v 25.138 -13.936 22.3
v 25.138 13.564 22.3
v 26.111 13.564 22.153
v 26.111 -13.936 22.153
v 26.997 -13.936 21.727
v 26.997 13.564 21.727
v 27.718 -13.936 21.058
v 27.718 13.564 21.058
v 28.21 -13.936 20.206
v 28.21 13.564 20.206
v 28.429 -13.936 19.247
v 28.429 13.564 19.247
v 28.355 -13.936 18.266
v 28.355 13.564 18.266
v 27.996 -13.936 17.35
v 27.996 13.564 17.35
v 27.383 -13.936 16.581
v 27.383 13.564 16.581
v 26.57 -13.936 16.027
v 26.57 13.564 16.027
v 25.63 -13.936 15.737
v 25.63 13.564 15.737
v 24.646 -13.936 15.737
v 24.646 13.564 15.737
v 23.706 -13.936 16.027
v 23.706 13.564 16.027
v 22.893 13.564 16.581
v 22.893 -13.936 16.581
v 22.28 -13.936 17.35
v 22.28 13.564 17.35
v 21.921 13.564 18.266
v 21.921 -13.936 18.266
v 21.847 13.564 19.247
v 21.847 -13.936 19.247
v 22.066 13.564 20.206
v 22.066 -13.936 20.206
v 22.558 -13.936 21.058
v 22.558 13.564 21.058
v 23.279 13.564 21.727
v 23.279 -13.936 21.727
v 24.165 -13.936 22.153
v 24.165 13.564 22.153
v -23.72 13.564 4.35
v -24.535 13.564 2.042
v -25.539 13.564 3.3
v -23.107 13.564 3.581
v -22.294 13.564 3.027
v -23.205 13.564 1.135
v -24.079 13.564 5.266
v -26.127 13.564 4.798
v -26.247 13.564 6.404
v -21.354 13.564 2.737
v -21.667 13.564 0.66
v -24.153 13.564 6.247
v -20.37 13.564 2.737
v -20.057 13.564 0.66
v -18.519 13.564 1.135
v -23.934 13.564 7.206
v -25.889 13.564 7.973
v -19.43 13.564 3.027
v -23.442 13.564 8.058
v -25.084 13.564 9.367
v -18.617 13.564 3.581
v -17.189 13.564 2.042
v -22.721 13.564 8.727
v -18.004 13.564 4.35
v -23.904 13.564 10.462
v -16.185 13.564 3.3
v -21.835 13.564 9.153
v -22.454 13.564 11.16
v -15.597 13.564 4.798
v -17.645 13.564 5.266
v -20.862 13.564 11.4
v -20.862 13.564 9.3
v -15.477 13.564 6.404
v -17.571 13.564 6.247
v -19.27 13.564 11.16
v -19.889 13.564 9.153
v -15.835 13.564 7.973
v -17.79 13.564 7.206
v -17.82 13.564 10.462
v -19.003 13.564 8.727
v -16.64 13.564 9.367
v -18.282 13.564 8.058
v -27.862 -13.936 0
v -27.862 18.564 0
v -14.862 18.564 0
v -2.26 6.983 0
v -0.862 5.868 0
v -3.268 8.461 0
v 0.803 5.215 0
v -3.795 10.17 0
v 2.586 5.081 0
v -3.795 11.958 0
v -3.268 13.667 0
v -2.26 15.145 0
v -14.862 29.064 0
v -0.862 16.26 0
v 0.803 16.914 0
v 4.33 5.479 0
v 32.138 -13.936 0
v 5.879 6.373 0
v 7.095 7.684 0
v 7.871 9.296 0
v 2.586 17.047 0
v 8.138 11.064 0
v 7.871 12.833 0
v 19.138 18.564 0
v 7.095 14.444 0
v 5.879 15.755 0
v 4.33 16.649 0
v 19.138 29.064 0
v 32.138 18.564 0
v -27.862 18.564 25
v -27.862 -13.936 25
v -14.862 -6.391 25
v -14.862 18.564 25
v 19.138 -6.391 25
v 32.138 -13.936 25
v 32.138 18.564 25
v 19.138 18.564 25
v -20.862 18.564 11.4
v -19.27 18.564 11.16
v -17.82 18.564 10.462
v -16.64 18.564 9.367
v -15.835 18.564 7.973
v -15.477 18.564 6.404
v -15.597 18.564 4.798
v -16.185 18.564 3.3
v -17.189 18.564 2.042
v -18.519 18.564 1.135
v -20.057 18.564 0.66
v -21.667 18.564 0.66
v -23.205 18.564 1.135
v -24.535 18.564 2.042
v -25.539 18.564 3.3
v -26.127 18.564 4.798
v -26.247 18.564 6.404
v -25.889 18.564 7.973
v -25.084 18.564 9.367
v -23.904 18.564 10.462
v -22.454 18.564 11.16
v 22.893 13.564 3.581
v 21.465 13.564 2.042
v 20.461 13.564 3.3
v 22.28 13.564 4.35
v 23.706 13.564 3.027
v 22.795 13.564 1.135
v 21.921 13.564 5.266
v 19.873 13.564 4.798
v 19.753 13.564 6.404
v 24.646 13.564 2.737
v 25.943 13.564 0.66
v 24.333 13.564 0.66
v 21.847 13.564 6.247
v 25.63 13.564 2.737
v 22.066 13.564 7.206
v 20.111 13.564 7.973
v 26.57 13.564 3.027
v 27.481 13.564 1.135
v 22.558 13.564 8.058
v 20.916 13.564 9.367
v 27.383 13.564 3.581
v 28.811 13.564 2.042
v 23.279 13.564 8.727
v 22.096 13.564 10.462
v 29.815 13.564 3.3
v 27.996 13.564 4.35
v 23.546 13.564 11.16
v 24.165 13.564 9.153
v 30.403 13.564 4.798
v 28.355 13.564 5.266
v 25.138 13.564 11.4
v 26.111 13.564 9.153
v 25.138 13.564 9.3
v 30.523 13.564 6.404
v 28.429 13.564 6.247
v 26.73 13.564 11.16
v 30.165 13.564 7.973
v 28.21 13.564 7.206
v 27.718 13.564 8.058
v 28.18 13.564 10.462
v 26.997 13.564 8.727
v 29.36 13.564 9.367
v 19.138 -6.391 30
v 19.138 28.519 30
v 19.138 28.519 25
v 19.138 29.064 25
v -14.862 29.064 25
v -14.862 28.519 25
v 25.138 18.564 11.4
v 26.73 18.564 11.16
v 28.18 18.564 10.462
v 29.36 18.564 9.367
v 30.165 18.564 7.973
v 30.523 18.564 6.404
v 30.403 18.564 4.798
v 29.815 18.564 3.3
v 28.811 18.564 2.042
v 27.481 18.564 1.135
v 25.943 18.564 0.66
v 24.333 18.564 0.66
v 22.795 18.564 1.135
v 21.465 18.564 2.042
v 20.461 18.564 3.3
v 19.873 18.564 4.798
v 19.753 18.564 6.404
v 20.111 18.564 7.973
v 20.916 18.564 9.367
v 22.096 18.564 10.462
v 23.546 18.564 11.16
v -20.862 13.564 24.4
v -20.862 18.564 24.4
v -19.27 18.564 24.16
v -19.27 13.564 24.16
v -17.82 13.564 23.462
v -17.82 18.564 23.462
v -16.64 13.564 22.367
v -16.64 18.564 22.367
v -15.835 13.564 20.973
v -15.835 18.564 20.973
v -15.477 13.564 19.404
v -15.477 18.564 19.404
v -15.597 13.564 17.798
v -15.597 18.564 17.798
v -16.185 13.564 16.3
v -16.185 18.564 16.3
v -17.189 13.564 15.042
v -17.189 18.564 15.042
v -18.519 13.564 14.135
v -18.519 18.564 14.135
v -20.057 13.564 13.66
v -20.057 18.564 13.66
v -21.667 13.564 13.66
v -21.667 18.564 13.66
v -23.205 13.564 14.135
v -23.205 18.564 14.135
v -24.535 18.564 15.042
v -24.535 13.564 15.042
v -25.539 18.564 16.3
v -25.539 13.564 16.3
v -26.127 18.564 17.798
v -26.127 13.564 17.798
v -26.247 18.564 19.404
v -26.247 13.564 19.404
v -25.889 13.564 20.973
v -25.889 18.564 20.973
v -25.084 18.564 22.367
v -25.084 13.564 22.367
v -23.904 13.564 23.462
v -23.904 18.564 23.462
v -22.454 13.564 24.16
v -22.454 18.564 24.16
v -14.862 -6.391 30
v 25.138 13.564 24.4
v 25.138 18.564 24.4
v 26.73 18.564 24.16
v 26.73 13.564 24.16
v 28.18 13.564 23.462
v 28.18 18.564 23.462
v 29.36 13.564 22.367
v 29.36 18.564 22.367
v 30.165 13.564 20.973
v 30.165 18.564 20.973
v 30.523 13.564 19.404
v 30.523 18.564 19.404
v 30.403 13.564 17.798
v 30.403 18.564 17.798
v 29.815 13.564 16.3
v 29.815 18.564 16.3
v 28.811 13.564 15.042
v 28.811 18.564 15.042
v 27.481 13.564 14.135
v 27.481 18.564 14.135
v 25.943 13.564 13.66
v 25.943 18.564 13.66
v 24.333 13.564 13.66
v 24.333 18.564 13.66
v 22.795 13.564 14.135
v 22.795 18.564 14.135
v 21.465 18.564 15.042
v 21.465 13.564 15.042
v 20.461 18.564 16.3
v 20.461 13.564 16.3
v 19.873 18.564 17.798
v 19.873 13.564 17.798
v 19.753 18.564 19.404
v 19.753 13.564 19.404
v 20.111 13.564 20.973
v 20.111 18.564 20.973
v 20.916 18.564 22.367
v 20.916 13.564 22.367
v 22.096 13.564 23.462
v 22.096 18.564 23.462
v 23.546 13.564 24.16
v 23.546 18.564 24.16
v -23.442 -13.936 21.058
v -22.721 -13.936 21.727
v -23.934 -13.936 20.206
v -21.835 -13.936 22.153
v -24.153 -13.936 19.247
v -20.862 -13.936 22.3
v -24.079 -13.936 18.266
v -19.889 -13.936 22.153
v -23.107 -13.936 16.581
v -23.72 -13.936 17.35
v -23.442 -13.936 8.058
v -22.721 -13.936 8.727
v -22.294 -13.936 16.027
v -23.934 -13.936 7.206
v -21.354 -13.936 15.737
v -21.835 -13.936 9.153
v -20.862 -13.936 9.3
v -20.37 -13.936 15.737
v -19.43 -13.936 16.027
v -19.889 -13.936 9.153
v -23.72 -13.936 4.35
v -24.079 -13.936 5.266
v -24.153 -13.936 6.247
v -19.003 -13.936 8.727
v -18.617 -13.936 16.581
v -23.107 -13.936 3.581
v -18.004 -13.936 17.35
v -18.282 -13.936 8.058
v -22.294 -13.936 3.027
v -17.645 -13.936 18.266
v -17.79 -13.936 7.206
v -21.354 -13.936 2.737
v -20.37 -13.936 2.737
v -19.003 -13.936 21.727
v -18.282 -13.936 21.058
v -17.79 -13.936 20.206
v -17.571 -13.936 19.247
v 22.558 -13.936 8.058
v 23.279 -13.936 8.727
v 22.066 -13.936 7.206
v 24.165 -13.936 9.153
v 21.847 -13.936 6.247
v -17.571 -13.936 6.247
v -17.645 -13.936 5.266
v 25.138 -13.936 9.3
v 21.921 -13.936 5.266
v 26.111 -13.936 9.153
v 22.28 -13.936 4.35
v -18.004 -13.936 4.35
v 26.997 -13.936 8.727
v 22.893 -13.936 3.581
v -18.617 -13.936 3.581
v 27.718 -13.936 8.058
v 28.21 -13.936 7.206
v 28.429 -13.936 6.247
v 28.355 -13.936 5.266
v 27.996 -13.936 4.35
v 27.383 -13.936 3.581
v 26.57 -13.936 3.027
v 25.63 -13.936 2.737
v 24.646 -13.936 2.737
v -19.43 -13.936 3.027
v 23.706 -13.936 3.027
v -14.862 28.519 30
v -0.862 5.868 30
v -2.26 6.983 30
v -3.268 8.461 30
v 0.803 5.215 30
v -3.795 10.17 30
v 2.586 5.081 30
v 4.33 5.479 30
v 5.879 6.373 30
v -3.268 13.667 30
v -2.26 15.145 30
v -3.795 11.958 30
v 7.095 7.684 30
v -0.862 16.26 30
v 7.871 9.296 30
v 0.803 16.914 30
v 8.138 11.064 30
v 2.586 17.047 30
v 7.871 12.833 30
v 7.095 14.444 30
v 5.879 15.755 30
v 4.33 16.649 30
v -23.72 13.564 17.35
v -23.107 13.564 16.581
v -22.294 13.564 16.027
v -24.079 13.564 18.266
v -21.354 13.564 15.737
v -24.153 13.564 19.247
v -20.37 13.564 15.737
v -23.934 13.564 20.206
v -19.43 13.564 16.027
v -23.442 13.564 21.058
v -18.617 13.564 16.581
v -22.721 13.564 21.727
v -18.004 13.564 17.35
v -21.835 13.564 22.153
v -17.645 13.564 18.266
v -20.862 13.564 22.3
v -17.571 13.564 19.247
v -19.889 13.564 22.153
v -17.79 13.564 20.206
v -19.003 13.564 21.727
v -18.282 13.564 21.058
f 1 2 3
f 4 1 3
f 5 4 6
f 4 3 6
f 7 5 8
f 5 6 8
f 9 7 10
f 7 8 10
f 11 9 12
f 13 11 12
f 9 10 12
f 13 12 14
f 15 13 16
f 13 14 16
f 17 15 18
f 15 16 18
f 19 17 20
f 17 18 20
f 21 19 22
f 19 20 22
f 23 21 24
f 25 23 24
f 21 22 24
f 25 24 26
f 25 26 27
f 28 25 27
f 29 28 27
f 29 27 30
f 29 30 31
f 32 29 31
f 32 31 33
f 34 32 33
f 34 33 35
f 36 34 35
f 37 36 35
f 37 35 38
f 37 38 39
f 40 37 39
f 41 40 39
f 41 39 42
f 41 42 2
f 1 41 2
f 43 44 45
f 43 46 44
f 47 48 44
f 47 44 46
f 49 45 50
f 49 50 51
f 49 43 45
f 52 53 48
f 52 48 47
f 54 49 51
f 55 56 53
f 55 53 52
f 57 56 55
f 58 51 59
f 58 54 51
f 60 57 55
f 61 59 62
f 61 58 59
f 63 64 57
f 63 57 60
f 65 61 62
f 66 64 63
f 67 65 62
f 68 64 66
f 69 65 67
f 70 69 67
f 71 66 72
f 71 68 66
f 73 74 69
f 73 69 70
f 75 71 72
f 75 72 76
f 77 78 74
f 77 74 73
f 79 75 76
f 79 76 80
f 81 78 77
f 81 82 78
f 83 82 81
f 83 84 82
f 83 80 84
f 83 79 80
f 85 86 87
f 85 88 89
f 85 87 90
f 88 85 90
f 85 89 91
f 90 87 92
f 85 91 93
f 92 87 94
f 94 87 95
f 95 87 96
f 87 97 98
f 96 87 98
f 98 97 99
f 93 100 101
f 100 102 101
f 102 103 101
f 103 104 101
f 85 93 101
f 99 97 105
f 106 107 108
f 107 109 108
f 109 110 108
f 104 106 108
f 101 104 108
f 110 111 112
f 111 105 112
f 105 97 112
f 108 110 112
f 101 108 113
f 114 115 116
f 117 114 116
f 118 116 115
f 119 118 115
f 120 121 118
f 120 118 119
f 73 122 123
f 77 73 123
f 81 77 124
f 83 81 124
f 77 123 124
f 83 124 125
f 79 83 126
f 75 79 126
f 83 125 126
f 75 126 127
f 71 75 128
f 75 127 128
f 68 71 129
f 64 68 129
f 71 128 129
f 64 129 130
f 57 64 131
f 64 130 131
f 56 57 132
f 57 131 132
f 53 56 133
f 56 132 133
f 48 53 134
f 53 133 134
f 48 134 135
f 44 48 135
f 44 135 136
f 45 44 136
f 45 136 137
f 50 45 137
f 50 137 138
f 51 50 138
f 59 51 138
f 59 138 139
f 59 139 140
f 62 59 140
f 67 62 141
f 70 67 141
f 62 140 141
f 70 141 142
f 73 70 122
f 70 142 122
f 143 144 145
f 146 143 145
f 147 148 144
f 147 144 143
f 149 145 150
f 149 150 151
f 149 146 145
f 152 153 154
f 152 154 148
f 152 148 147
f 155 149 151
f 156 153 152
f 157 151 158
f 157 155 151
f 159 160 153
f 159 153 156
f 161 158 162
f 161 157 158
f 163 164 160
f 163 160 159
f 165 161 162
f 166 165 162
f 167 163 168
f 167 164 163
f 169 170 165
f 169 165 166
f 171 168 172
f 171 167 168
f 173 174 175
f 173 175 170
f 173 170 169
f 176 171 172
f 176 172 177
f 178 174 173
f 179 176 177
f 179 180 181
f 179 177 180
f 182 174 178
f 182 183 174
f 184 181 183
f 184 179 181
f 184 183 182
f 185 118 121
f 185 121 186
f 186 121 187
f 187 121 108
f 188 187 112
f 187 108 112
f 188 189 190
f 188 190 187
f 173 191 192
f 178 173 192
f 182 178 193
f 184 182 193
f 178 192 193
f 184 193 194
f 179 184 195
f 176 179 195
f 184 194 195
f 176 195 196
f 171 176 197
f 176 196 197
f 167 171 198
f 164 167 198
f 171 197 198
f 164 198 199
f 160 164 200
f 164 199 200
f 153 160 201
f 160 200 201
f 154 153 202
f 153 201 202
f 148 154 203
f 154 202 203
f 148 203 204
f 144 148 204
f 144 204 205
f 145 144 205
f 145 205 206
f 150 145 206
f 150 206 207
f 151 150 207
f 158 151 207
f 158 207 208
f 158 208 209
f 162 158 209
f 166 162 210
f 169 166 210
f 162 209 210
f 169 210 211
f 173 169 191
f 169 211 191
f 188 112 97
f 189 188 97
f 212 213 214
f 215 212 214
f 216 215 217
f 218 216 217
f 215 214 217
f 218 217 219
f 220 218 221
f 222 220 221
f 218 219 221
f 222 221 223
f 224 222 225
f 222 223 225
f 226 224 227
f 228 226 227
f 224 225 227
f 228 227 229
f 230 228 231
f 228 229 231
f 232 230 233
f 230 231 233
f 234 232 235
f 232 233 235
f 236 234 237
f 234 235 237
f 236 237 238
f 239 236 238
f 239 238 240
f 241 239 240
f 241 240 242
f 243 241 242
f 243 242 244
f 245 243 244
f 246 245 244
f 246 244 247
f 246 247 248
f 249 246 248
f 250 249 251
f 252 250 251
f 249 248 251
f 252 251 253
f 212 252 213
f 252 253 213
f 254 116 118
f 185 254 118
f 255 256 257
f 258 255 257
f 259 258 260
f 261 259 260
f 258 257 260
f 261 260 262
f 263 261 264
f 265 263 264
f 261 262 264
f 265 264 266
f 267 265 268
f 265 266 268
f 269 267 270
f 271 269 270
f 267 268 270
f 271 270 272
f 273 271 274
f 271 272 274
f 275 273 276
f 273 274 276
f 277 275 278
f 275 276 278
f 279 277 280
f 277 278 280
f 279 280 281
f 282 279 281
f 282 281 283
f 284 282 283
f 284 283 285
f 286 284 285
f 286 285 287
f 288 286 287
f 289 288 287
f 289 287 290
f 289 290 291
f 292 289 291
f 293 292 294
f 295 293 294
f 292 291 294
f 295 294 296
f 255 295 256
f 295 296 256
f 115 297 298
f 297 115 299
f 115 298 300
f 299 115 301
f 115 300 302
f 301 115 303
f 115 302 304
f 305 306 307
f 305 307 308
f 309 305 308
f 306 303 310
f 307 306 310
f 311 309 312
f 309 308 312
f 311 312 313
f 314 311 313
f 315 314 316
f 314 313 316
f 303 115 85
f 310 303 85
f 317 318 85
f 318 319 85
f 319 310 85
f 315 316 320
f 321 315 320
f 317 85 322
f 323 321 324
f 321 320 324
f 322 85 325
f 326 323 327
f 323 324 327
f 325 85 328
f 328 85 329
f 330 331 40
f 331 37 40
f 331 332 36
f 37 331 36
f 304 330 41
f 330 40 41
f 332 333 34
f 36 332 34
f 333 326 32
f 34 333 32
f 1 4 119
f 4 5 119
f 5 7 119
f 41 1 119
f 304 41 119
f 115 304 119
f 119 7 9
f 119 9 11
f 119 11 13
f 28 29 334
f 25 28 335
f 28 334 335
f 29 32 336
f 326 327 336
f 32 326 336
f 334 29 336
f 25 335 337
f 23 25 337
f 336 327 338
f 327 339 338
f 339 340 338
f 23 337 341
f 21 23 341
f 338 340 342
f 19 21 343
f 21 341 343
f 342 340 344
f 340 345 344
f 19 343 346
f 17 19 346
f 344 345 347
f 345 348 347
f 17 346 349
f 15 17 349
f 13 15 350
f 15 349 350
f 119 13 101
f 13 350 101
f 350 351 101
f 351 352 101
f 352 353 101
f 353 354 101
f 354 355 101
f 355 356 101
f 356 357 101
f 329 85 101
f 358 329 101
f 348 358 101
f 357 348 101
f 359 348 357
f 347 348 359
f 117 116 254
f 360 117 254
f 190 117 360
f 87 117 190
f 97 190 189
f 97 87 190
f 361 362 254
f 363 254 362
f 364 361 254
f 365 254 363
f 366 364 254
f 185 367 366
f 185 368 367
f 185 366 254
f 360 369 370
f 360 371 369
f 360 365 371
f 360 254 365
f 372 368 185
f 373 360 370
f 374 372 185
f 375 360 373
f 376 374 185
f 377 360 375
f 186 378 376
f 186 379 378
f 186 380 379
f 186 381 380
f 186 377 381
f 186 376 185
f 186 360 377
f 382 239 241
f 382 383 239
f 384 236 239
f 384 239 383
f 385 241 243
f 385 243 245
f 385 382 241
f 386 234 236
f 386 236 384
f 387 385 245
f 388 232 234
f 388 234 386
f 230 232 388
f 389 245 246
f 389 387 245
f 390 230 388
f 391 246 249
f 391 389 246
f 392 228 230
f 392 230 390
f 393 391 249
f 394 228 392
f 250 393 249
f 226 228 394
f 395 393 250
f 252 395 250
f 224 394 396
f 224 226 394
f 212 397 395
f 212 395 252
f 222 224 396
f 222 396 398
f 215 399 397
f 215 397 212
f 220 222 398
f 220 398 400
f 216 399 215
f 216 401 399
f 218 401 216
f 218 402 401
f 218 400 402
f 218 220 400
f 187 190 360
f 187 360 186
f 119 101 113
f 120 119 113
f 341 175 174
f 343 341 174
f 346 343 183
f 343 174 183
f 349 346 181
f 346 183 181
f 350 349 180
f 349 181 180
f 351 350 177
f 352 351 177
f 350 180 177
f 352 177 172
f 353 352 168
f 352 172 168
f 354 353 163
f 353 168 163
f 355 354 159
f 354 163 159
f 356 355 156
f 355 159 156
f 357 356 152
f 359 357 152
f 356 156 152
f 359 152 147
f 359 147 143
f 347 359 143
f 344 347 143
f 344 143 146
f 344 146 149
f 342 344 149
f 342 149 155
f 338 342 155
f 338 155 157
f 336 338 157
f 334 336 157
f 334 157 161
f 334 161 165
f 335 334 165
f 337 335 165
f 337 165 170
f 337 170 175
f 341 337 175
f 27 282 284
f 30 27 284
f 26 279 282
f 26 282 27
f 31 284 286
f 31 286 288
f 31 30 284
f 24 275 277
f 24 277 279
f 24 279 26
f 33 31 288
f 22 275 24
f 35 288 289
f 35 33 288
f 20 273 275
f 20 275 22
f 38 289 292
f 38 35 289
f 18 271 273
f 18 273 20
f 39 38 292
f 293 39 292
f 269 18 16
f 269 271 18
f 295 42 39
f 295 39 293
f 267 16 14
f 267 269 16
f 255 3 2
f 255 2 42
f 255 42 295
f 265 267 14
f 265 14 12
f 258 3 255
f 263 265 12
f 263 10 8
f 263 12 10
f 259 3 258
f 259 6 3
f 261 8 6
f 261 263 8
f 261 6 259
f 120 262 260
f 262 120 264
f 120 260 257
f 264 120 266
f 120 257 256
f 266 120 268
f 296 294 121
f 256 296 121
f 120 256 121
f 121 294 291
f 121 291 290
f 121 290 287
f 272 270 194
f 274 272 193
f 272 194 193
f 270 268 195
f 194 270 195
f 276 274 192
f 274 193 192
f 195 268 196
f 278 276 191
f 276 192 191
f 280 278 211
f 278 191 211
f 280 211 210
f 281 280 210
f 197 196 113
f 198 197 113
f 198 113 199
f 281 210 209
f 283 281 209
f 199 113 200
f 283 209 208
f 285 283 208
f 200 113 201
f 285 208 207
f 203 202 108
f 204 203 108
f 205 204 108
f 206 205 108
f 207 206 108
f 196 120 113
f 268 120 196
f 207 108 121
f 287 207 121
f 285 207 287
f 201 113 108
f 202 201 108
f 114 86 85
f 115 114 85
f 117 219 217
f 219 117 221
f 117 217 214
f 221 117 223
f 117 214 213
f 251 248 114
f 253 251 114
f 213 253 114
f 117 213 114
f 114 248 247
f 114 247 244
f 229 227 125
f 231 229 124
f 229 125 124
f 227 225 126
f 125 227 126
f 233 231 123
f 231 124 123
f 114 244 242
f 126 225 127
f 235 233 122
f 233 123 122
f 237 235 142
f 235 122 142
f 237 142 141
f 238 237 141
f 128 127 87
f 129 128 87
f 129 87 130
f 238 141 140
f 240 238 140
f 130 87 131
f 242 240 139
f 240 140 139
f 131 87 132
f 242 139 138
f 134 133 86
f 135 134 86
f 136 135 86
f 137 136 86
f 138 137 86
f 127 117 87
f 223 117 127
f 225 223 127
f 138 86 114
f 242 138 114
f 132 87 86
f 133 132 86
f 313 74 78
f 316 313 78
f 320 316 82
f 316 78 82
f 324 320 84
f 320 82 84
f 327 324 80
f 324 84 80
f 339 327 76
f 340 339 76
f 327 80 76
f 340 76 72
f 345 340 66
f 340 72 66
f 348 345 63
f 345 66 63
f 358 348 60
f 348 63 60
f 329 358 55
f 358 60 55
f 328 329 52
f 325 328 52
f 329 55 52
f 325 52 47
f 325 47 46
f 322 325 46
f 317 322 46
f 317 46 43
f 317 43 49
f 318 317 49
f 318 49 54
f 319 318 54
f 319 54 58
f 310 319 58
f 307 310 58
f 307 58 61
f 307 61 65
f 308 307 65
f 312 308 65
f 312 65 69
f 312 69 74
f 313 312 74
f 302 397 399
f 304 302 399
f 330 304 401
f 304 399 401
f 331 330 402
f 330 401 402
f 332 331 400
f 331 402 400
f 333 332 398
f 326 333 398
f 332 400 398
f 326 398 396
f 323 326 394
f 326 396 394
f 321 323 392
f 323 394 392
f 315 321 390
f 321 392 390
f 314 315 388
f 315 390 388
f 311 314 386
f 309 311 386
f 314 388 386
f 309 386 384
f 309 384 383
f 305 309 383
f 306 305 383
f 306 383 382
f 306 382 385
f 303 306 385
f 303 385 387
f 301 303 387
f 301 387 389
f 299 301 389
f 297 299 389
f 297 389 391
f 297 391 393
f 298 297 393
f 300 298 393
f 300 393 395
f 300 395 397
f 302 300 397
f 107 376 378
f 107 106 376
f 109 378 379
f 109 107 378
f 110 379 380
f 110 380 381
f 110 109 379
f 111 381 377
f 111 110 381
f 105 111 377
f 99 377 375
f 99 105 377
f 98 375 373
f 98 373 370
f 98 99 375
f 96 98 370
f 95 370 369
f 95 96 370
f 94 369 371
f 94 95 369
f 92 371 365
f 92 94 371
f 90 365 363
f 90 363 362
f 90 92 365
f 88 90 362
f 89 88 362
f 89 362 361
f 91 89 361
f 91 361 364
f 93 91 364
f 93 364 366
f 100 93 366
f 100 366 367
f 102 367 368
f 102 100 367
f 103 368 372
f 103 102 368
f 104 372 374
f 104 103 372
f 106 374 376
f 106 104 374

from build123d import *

# Parameters (mm, degrees)
ESQUISSE1_R             = 6
BOSS_EXTRU_1_DEPTH      = 25
ENL_V_MAT_EXTRU_1_REACH = 54.097
ESQUISSE2_R             = 3.3
ESQUISSE3_R             = 5.4
ENL_V_MAT_EXTRU_2_DEPTH = 5
ESQUISSE4_W             = 34
ESQUISSE4_H             = 34.910709465
ESQUISSE4_R             = 6
BOSS_EXTRU_2_DEPTH      = 5


with BuildPart() as part:
    # Esquisse1 → Boss.-Extru.1 (new body)
    with BuildSketch(Plane.XY):
        Polygon((-27.861974124, -13.935926773), (32.138025876, -13.935926773), (32.138025876, 18.564073227), (19.138025876, 18.564073227), (19.138025876, 29.064073227), (-14.861974124, 29.064073227), (-14.861974124, 18.564073227), (-27.861974124, 18.564073227), align=None)
        with Locations((2.138025876, 11.064073227)):
            Circle(ESQUISSE1_R, mode=Mode.SUBTRACT)
    extrude(amount=BOSS_EXTRU_1_DEPTH)

    # Esquisse2 → Enlèv. mat.-Extru.1 (cut, up to next)
    with BuildSketch(Plane(origin=(0, 18.564073227, 0), x_dir=(1, 0, 0), z_dir=(0, 1, 0)), mode=Mode.PRIVATE) as enl_v_mat_extru_1_sk1:
        with Locations(Location((25.138025876, -19, 0), (0, 0, 270))):
            Circle(ESQUISSE2_R)
    enl_v_mat_extru_1_tool1 = extrude(enl_v_mat_extru_1_sk1.sketch, amount=-ENL_V_MAT_EXTRU_1_REACH, mode=Mode.PRIVATE) & part.part
    # Esquisse2 → Enlèv. mat.-Extru.1 (cut, up to next)
    with BuildSketch(Plane(origin=(0, 18.564073227, 0), x_dir=(1, 0, 0), z_dir=(0, 1, 0)), mode=Mode.PRIVATE) as enl_v_mat_extru_1_sk2:
        with Locations(Location((25.138025876, -6, 0), (0, 0, 270))):
            Circle(ESQUISSE2_R)
    enl_v_mat_extru_1_tool2 = extrude(enl_v_mat_extru_1_sk2.sketch, amount=-ENL_V_MAT_EXTRU_1_REACH, mode=Mode.PRIVATE) & part.part
    # Esquisse2 → Enlèv. mat.-Extru.1 (cut, up to next)
    with BuildSketch(Plane(origin=(0, 18.564073227, 0), x_dir=(1, 0, 0), z_dir=(0, 1, 0)), mode=Mode.PRIVATE) as enl_v_mat_extru_1_sk3:
        with Locations(Location((-20.861974124, -19, 0), (0, 0, 270))):
            Circle(ESQUISSE2_R)
    enl_v_mat_extru_1_tool3 = extrude(enl_v_mat_extru_1_sk3.sketch, amount=-ENL_V_MAT_EXTRU_1_REACH, mode=Mode.PRIVATE) & part.part
    # Esquisse2 → Enlèv. mat.-Extru.1 (cut, up to next)
    with BuildSketch(Plane(origin=(0, 18.564073227, 0), x_dir=(1, 0, 0), z_dir=(0, 1, 0)), mode=Mode.PRIVATE) as enl_v_mat_extru_1_sk4:
        with Locations(Location((-20.861974124, -6, 0), (0, 0, 270))):
            Circle(ESQUISSE2_R)
    enl_v_mat_extru_1_tool4 = extrude(enl_v_mat_extru_1_sk4.sketch, amount=-ENL_V_MAT_EXTRU_1_REACH, mode=Mode.PRIVATE) & part.part
    add(enl_v_mat_extru_1_tool1.solids().sort_by_distance((25.138026, 18.564073, 19))[0], mode=Mode.SUBTRACT)
    add(enl_v_mat_extru_1_tool2.solids().sort_by_distance((25.138026, 18.564073, 6))[0], mode=Mode.SUBTRACT)
    add(enl_v_mat_extru_1_tool3.solids().sort_by_distance((-20.861974, 18.564073, 19))[0], mode=Mode.SUBTRACT)
    add(enl_v_mat_extru_1_tool4.solids().sort_by_distance((-20.861974, 18.564073, 6))[0], mode=Mode.SUBTRACT)

    # Esquisse3 → Enlèv. mat.-Extru.2 (cut)
    with BuildSketch(Plane(origin=(0, 18.564073227, 0), x_dir=(1, 0, 0), z_dir=(0, 1, 0))):
        with Locations(Location((25.138025876, -19, 0), (0, 0, 270))):
            Circle(ESQUISSE3_R)
        with Locations(Location((25.138025876, -6, 0), (0, 0, 270))):
            Circle(ESQUISSE3_R)
        with Locations(Location((-20.861974124, -6, 0), (0, 0, 270))):
            Circle(ESQUISSE3_R)
        with Locations(Location((-20.861974124, -19, 0), (0, 0, 270))):
            Circle(ESQUISSE3_R)
    extrude(amount=-ENL_V_MAT_EXTRU_2_DEPTH, mode=Mode.SUBTRACT)

    # Esquisse4 → Boss.-Extru.2 (add)
    with BuildSketch(Plane.XY.offset(25)):
        with Locations((2.138025876, 11.064073226)):
            Rectangle(ESQUISSE4_W, ESQUISSE4_H)
        with Locations((2.138025876, 11.064073227)):
            Circle(ESQUISSE4_R, mode=Mode.SUBTRACT)
    extrude(amount=BOSS_EXTRU_2_DEPTH)


solid = part.part
